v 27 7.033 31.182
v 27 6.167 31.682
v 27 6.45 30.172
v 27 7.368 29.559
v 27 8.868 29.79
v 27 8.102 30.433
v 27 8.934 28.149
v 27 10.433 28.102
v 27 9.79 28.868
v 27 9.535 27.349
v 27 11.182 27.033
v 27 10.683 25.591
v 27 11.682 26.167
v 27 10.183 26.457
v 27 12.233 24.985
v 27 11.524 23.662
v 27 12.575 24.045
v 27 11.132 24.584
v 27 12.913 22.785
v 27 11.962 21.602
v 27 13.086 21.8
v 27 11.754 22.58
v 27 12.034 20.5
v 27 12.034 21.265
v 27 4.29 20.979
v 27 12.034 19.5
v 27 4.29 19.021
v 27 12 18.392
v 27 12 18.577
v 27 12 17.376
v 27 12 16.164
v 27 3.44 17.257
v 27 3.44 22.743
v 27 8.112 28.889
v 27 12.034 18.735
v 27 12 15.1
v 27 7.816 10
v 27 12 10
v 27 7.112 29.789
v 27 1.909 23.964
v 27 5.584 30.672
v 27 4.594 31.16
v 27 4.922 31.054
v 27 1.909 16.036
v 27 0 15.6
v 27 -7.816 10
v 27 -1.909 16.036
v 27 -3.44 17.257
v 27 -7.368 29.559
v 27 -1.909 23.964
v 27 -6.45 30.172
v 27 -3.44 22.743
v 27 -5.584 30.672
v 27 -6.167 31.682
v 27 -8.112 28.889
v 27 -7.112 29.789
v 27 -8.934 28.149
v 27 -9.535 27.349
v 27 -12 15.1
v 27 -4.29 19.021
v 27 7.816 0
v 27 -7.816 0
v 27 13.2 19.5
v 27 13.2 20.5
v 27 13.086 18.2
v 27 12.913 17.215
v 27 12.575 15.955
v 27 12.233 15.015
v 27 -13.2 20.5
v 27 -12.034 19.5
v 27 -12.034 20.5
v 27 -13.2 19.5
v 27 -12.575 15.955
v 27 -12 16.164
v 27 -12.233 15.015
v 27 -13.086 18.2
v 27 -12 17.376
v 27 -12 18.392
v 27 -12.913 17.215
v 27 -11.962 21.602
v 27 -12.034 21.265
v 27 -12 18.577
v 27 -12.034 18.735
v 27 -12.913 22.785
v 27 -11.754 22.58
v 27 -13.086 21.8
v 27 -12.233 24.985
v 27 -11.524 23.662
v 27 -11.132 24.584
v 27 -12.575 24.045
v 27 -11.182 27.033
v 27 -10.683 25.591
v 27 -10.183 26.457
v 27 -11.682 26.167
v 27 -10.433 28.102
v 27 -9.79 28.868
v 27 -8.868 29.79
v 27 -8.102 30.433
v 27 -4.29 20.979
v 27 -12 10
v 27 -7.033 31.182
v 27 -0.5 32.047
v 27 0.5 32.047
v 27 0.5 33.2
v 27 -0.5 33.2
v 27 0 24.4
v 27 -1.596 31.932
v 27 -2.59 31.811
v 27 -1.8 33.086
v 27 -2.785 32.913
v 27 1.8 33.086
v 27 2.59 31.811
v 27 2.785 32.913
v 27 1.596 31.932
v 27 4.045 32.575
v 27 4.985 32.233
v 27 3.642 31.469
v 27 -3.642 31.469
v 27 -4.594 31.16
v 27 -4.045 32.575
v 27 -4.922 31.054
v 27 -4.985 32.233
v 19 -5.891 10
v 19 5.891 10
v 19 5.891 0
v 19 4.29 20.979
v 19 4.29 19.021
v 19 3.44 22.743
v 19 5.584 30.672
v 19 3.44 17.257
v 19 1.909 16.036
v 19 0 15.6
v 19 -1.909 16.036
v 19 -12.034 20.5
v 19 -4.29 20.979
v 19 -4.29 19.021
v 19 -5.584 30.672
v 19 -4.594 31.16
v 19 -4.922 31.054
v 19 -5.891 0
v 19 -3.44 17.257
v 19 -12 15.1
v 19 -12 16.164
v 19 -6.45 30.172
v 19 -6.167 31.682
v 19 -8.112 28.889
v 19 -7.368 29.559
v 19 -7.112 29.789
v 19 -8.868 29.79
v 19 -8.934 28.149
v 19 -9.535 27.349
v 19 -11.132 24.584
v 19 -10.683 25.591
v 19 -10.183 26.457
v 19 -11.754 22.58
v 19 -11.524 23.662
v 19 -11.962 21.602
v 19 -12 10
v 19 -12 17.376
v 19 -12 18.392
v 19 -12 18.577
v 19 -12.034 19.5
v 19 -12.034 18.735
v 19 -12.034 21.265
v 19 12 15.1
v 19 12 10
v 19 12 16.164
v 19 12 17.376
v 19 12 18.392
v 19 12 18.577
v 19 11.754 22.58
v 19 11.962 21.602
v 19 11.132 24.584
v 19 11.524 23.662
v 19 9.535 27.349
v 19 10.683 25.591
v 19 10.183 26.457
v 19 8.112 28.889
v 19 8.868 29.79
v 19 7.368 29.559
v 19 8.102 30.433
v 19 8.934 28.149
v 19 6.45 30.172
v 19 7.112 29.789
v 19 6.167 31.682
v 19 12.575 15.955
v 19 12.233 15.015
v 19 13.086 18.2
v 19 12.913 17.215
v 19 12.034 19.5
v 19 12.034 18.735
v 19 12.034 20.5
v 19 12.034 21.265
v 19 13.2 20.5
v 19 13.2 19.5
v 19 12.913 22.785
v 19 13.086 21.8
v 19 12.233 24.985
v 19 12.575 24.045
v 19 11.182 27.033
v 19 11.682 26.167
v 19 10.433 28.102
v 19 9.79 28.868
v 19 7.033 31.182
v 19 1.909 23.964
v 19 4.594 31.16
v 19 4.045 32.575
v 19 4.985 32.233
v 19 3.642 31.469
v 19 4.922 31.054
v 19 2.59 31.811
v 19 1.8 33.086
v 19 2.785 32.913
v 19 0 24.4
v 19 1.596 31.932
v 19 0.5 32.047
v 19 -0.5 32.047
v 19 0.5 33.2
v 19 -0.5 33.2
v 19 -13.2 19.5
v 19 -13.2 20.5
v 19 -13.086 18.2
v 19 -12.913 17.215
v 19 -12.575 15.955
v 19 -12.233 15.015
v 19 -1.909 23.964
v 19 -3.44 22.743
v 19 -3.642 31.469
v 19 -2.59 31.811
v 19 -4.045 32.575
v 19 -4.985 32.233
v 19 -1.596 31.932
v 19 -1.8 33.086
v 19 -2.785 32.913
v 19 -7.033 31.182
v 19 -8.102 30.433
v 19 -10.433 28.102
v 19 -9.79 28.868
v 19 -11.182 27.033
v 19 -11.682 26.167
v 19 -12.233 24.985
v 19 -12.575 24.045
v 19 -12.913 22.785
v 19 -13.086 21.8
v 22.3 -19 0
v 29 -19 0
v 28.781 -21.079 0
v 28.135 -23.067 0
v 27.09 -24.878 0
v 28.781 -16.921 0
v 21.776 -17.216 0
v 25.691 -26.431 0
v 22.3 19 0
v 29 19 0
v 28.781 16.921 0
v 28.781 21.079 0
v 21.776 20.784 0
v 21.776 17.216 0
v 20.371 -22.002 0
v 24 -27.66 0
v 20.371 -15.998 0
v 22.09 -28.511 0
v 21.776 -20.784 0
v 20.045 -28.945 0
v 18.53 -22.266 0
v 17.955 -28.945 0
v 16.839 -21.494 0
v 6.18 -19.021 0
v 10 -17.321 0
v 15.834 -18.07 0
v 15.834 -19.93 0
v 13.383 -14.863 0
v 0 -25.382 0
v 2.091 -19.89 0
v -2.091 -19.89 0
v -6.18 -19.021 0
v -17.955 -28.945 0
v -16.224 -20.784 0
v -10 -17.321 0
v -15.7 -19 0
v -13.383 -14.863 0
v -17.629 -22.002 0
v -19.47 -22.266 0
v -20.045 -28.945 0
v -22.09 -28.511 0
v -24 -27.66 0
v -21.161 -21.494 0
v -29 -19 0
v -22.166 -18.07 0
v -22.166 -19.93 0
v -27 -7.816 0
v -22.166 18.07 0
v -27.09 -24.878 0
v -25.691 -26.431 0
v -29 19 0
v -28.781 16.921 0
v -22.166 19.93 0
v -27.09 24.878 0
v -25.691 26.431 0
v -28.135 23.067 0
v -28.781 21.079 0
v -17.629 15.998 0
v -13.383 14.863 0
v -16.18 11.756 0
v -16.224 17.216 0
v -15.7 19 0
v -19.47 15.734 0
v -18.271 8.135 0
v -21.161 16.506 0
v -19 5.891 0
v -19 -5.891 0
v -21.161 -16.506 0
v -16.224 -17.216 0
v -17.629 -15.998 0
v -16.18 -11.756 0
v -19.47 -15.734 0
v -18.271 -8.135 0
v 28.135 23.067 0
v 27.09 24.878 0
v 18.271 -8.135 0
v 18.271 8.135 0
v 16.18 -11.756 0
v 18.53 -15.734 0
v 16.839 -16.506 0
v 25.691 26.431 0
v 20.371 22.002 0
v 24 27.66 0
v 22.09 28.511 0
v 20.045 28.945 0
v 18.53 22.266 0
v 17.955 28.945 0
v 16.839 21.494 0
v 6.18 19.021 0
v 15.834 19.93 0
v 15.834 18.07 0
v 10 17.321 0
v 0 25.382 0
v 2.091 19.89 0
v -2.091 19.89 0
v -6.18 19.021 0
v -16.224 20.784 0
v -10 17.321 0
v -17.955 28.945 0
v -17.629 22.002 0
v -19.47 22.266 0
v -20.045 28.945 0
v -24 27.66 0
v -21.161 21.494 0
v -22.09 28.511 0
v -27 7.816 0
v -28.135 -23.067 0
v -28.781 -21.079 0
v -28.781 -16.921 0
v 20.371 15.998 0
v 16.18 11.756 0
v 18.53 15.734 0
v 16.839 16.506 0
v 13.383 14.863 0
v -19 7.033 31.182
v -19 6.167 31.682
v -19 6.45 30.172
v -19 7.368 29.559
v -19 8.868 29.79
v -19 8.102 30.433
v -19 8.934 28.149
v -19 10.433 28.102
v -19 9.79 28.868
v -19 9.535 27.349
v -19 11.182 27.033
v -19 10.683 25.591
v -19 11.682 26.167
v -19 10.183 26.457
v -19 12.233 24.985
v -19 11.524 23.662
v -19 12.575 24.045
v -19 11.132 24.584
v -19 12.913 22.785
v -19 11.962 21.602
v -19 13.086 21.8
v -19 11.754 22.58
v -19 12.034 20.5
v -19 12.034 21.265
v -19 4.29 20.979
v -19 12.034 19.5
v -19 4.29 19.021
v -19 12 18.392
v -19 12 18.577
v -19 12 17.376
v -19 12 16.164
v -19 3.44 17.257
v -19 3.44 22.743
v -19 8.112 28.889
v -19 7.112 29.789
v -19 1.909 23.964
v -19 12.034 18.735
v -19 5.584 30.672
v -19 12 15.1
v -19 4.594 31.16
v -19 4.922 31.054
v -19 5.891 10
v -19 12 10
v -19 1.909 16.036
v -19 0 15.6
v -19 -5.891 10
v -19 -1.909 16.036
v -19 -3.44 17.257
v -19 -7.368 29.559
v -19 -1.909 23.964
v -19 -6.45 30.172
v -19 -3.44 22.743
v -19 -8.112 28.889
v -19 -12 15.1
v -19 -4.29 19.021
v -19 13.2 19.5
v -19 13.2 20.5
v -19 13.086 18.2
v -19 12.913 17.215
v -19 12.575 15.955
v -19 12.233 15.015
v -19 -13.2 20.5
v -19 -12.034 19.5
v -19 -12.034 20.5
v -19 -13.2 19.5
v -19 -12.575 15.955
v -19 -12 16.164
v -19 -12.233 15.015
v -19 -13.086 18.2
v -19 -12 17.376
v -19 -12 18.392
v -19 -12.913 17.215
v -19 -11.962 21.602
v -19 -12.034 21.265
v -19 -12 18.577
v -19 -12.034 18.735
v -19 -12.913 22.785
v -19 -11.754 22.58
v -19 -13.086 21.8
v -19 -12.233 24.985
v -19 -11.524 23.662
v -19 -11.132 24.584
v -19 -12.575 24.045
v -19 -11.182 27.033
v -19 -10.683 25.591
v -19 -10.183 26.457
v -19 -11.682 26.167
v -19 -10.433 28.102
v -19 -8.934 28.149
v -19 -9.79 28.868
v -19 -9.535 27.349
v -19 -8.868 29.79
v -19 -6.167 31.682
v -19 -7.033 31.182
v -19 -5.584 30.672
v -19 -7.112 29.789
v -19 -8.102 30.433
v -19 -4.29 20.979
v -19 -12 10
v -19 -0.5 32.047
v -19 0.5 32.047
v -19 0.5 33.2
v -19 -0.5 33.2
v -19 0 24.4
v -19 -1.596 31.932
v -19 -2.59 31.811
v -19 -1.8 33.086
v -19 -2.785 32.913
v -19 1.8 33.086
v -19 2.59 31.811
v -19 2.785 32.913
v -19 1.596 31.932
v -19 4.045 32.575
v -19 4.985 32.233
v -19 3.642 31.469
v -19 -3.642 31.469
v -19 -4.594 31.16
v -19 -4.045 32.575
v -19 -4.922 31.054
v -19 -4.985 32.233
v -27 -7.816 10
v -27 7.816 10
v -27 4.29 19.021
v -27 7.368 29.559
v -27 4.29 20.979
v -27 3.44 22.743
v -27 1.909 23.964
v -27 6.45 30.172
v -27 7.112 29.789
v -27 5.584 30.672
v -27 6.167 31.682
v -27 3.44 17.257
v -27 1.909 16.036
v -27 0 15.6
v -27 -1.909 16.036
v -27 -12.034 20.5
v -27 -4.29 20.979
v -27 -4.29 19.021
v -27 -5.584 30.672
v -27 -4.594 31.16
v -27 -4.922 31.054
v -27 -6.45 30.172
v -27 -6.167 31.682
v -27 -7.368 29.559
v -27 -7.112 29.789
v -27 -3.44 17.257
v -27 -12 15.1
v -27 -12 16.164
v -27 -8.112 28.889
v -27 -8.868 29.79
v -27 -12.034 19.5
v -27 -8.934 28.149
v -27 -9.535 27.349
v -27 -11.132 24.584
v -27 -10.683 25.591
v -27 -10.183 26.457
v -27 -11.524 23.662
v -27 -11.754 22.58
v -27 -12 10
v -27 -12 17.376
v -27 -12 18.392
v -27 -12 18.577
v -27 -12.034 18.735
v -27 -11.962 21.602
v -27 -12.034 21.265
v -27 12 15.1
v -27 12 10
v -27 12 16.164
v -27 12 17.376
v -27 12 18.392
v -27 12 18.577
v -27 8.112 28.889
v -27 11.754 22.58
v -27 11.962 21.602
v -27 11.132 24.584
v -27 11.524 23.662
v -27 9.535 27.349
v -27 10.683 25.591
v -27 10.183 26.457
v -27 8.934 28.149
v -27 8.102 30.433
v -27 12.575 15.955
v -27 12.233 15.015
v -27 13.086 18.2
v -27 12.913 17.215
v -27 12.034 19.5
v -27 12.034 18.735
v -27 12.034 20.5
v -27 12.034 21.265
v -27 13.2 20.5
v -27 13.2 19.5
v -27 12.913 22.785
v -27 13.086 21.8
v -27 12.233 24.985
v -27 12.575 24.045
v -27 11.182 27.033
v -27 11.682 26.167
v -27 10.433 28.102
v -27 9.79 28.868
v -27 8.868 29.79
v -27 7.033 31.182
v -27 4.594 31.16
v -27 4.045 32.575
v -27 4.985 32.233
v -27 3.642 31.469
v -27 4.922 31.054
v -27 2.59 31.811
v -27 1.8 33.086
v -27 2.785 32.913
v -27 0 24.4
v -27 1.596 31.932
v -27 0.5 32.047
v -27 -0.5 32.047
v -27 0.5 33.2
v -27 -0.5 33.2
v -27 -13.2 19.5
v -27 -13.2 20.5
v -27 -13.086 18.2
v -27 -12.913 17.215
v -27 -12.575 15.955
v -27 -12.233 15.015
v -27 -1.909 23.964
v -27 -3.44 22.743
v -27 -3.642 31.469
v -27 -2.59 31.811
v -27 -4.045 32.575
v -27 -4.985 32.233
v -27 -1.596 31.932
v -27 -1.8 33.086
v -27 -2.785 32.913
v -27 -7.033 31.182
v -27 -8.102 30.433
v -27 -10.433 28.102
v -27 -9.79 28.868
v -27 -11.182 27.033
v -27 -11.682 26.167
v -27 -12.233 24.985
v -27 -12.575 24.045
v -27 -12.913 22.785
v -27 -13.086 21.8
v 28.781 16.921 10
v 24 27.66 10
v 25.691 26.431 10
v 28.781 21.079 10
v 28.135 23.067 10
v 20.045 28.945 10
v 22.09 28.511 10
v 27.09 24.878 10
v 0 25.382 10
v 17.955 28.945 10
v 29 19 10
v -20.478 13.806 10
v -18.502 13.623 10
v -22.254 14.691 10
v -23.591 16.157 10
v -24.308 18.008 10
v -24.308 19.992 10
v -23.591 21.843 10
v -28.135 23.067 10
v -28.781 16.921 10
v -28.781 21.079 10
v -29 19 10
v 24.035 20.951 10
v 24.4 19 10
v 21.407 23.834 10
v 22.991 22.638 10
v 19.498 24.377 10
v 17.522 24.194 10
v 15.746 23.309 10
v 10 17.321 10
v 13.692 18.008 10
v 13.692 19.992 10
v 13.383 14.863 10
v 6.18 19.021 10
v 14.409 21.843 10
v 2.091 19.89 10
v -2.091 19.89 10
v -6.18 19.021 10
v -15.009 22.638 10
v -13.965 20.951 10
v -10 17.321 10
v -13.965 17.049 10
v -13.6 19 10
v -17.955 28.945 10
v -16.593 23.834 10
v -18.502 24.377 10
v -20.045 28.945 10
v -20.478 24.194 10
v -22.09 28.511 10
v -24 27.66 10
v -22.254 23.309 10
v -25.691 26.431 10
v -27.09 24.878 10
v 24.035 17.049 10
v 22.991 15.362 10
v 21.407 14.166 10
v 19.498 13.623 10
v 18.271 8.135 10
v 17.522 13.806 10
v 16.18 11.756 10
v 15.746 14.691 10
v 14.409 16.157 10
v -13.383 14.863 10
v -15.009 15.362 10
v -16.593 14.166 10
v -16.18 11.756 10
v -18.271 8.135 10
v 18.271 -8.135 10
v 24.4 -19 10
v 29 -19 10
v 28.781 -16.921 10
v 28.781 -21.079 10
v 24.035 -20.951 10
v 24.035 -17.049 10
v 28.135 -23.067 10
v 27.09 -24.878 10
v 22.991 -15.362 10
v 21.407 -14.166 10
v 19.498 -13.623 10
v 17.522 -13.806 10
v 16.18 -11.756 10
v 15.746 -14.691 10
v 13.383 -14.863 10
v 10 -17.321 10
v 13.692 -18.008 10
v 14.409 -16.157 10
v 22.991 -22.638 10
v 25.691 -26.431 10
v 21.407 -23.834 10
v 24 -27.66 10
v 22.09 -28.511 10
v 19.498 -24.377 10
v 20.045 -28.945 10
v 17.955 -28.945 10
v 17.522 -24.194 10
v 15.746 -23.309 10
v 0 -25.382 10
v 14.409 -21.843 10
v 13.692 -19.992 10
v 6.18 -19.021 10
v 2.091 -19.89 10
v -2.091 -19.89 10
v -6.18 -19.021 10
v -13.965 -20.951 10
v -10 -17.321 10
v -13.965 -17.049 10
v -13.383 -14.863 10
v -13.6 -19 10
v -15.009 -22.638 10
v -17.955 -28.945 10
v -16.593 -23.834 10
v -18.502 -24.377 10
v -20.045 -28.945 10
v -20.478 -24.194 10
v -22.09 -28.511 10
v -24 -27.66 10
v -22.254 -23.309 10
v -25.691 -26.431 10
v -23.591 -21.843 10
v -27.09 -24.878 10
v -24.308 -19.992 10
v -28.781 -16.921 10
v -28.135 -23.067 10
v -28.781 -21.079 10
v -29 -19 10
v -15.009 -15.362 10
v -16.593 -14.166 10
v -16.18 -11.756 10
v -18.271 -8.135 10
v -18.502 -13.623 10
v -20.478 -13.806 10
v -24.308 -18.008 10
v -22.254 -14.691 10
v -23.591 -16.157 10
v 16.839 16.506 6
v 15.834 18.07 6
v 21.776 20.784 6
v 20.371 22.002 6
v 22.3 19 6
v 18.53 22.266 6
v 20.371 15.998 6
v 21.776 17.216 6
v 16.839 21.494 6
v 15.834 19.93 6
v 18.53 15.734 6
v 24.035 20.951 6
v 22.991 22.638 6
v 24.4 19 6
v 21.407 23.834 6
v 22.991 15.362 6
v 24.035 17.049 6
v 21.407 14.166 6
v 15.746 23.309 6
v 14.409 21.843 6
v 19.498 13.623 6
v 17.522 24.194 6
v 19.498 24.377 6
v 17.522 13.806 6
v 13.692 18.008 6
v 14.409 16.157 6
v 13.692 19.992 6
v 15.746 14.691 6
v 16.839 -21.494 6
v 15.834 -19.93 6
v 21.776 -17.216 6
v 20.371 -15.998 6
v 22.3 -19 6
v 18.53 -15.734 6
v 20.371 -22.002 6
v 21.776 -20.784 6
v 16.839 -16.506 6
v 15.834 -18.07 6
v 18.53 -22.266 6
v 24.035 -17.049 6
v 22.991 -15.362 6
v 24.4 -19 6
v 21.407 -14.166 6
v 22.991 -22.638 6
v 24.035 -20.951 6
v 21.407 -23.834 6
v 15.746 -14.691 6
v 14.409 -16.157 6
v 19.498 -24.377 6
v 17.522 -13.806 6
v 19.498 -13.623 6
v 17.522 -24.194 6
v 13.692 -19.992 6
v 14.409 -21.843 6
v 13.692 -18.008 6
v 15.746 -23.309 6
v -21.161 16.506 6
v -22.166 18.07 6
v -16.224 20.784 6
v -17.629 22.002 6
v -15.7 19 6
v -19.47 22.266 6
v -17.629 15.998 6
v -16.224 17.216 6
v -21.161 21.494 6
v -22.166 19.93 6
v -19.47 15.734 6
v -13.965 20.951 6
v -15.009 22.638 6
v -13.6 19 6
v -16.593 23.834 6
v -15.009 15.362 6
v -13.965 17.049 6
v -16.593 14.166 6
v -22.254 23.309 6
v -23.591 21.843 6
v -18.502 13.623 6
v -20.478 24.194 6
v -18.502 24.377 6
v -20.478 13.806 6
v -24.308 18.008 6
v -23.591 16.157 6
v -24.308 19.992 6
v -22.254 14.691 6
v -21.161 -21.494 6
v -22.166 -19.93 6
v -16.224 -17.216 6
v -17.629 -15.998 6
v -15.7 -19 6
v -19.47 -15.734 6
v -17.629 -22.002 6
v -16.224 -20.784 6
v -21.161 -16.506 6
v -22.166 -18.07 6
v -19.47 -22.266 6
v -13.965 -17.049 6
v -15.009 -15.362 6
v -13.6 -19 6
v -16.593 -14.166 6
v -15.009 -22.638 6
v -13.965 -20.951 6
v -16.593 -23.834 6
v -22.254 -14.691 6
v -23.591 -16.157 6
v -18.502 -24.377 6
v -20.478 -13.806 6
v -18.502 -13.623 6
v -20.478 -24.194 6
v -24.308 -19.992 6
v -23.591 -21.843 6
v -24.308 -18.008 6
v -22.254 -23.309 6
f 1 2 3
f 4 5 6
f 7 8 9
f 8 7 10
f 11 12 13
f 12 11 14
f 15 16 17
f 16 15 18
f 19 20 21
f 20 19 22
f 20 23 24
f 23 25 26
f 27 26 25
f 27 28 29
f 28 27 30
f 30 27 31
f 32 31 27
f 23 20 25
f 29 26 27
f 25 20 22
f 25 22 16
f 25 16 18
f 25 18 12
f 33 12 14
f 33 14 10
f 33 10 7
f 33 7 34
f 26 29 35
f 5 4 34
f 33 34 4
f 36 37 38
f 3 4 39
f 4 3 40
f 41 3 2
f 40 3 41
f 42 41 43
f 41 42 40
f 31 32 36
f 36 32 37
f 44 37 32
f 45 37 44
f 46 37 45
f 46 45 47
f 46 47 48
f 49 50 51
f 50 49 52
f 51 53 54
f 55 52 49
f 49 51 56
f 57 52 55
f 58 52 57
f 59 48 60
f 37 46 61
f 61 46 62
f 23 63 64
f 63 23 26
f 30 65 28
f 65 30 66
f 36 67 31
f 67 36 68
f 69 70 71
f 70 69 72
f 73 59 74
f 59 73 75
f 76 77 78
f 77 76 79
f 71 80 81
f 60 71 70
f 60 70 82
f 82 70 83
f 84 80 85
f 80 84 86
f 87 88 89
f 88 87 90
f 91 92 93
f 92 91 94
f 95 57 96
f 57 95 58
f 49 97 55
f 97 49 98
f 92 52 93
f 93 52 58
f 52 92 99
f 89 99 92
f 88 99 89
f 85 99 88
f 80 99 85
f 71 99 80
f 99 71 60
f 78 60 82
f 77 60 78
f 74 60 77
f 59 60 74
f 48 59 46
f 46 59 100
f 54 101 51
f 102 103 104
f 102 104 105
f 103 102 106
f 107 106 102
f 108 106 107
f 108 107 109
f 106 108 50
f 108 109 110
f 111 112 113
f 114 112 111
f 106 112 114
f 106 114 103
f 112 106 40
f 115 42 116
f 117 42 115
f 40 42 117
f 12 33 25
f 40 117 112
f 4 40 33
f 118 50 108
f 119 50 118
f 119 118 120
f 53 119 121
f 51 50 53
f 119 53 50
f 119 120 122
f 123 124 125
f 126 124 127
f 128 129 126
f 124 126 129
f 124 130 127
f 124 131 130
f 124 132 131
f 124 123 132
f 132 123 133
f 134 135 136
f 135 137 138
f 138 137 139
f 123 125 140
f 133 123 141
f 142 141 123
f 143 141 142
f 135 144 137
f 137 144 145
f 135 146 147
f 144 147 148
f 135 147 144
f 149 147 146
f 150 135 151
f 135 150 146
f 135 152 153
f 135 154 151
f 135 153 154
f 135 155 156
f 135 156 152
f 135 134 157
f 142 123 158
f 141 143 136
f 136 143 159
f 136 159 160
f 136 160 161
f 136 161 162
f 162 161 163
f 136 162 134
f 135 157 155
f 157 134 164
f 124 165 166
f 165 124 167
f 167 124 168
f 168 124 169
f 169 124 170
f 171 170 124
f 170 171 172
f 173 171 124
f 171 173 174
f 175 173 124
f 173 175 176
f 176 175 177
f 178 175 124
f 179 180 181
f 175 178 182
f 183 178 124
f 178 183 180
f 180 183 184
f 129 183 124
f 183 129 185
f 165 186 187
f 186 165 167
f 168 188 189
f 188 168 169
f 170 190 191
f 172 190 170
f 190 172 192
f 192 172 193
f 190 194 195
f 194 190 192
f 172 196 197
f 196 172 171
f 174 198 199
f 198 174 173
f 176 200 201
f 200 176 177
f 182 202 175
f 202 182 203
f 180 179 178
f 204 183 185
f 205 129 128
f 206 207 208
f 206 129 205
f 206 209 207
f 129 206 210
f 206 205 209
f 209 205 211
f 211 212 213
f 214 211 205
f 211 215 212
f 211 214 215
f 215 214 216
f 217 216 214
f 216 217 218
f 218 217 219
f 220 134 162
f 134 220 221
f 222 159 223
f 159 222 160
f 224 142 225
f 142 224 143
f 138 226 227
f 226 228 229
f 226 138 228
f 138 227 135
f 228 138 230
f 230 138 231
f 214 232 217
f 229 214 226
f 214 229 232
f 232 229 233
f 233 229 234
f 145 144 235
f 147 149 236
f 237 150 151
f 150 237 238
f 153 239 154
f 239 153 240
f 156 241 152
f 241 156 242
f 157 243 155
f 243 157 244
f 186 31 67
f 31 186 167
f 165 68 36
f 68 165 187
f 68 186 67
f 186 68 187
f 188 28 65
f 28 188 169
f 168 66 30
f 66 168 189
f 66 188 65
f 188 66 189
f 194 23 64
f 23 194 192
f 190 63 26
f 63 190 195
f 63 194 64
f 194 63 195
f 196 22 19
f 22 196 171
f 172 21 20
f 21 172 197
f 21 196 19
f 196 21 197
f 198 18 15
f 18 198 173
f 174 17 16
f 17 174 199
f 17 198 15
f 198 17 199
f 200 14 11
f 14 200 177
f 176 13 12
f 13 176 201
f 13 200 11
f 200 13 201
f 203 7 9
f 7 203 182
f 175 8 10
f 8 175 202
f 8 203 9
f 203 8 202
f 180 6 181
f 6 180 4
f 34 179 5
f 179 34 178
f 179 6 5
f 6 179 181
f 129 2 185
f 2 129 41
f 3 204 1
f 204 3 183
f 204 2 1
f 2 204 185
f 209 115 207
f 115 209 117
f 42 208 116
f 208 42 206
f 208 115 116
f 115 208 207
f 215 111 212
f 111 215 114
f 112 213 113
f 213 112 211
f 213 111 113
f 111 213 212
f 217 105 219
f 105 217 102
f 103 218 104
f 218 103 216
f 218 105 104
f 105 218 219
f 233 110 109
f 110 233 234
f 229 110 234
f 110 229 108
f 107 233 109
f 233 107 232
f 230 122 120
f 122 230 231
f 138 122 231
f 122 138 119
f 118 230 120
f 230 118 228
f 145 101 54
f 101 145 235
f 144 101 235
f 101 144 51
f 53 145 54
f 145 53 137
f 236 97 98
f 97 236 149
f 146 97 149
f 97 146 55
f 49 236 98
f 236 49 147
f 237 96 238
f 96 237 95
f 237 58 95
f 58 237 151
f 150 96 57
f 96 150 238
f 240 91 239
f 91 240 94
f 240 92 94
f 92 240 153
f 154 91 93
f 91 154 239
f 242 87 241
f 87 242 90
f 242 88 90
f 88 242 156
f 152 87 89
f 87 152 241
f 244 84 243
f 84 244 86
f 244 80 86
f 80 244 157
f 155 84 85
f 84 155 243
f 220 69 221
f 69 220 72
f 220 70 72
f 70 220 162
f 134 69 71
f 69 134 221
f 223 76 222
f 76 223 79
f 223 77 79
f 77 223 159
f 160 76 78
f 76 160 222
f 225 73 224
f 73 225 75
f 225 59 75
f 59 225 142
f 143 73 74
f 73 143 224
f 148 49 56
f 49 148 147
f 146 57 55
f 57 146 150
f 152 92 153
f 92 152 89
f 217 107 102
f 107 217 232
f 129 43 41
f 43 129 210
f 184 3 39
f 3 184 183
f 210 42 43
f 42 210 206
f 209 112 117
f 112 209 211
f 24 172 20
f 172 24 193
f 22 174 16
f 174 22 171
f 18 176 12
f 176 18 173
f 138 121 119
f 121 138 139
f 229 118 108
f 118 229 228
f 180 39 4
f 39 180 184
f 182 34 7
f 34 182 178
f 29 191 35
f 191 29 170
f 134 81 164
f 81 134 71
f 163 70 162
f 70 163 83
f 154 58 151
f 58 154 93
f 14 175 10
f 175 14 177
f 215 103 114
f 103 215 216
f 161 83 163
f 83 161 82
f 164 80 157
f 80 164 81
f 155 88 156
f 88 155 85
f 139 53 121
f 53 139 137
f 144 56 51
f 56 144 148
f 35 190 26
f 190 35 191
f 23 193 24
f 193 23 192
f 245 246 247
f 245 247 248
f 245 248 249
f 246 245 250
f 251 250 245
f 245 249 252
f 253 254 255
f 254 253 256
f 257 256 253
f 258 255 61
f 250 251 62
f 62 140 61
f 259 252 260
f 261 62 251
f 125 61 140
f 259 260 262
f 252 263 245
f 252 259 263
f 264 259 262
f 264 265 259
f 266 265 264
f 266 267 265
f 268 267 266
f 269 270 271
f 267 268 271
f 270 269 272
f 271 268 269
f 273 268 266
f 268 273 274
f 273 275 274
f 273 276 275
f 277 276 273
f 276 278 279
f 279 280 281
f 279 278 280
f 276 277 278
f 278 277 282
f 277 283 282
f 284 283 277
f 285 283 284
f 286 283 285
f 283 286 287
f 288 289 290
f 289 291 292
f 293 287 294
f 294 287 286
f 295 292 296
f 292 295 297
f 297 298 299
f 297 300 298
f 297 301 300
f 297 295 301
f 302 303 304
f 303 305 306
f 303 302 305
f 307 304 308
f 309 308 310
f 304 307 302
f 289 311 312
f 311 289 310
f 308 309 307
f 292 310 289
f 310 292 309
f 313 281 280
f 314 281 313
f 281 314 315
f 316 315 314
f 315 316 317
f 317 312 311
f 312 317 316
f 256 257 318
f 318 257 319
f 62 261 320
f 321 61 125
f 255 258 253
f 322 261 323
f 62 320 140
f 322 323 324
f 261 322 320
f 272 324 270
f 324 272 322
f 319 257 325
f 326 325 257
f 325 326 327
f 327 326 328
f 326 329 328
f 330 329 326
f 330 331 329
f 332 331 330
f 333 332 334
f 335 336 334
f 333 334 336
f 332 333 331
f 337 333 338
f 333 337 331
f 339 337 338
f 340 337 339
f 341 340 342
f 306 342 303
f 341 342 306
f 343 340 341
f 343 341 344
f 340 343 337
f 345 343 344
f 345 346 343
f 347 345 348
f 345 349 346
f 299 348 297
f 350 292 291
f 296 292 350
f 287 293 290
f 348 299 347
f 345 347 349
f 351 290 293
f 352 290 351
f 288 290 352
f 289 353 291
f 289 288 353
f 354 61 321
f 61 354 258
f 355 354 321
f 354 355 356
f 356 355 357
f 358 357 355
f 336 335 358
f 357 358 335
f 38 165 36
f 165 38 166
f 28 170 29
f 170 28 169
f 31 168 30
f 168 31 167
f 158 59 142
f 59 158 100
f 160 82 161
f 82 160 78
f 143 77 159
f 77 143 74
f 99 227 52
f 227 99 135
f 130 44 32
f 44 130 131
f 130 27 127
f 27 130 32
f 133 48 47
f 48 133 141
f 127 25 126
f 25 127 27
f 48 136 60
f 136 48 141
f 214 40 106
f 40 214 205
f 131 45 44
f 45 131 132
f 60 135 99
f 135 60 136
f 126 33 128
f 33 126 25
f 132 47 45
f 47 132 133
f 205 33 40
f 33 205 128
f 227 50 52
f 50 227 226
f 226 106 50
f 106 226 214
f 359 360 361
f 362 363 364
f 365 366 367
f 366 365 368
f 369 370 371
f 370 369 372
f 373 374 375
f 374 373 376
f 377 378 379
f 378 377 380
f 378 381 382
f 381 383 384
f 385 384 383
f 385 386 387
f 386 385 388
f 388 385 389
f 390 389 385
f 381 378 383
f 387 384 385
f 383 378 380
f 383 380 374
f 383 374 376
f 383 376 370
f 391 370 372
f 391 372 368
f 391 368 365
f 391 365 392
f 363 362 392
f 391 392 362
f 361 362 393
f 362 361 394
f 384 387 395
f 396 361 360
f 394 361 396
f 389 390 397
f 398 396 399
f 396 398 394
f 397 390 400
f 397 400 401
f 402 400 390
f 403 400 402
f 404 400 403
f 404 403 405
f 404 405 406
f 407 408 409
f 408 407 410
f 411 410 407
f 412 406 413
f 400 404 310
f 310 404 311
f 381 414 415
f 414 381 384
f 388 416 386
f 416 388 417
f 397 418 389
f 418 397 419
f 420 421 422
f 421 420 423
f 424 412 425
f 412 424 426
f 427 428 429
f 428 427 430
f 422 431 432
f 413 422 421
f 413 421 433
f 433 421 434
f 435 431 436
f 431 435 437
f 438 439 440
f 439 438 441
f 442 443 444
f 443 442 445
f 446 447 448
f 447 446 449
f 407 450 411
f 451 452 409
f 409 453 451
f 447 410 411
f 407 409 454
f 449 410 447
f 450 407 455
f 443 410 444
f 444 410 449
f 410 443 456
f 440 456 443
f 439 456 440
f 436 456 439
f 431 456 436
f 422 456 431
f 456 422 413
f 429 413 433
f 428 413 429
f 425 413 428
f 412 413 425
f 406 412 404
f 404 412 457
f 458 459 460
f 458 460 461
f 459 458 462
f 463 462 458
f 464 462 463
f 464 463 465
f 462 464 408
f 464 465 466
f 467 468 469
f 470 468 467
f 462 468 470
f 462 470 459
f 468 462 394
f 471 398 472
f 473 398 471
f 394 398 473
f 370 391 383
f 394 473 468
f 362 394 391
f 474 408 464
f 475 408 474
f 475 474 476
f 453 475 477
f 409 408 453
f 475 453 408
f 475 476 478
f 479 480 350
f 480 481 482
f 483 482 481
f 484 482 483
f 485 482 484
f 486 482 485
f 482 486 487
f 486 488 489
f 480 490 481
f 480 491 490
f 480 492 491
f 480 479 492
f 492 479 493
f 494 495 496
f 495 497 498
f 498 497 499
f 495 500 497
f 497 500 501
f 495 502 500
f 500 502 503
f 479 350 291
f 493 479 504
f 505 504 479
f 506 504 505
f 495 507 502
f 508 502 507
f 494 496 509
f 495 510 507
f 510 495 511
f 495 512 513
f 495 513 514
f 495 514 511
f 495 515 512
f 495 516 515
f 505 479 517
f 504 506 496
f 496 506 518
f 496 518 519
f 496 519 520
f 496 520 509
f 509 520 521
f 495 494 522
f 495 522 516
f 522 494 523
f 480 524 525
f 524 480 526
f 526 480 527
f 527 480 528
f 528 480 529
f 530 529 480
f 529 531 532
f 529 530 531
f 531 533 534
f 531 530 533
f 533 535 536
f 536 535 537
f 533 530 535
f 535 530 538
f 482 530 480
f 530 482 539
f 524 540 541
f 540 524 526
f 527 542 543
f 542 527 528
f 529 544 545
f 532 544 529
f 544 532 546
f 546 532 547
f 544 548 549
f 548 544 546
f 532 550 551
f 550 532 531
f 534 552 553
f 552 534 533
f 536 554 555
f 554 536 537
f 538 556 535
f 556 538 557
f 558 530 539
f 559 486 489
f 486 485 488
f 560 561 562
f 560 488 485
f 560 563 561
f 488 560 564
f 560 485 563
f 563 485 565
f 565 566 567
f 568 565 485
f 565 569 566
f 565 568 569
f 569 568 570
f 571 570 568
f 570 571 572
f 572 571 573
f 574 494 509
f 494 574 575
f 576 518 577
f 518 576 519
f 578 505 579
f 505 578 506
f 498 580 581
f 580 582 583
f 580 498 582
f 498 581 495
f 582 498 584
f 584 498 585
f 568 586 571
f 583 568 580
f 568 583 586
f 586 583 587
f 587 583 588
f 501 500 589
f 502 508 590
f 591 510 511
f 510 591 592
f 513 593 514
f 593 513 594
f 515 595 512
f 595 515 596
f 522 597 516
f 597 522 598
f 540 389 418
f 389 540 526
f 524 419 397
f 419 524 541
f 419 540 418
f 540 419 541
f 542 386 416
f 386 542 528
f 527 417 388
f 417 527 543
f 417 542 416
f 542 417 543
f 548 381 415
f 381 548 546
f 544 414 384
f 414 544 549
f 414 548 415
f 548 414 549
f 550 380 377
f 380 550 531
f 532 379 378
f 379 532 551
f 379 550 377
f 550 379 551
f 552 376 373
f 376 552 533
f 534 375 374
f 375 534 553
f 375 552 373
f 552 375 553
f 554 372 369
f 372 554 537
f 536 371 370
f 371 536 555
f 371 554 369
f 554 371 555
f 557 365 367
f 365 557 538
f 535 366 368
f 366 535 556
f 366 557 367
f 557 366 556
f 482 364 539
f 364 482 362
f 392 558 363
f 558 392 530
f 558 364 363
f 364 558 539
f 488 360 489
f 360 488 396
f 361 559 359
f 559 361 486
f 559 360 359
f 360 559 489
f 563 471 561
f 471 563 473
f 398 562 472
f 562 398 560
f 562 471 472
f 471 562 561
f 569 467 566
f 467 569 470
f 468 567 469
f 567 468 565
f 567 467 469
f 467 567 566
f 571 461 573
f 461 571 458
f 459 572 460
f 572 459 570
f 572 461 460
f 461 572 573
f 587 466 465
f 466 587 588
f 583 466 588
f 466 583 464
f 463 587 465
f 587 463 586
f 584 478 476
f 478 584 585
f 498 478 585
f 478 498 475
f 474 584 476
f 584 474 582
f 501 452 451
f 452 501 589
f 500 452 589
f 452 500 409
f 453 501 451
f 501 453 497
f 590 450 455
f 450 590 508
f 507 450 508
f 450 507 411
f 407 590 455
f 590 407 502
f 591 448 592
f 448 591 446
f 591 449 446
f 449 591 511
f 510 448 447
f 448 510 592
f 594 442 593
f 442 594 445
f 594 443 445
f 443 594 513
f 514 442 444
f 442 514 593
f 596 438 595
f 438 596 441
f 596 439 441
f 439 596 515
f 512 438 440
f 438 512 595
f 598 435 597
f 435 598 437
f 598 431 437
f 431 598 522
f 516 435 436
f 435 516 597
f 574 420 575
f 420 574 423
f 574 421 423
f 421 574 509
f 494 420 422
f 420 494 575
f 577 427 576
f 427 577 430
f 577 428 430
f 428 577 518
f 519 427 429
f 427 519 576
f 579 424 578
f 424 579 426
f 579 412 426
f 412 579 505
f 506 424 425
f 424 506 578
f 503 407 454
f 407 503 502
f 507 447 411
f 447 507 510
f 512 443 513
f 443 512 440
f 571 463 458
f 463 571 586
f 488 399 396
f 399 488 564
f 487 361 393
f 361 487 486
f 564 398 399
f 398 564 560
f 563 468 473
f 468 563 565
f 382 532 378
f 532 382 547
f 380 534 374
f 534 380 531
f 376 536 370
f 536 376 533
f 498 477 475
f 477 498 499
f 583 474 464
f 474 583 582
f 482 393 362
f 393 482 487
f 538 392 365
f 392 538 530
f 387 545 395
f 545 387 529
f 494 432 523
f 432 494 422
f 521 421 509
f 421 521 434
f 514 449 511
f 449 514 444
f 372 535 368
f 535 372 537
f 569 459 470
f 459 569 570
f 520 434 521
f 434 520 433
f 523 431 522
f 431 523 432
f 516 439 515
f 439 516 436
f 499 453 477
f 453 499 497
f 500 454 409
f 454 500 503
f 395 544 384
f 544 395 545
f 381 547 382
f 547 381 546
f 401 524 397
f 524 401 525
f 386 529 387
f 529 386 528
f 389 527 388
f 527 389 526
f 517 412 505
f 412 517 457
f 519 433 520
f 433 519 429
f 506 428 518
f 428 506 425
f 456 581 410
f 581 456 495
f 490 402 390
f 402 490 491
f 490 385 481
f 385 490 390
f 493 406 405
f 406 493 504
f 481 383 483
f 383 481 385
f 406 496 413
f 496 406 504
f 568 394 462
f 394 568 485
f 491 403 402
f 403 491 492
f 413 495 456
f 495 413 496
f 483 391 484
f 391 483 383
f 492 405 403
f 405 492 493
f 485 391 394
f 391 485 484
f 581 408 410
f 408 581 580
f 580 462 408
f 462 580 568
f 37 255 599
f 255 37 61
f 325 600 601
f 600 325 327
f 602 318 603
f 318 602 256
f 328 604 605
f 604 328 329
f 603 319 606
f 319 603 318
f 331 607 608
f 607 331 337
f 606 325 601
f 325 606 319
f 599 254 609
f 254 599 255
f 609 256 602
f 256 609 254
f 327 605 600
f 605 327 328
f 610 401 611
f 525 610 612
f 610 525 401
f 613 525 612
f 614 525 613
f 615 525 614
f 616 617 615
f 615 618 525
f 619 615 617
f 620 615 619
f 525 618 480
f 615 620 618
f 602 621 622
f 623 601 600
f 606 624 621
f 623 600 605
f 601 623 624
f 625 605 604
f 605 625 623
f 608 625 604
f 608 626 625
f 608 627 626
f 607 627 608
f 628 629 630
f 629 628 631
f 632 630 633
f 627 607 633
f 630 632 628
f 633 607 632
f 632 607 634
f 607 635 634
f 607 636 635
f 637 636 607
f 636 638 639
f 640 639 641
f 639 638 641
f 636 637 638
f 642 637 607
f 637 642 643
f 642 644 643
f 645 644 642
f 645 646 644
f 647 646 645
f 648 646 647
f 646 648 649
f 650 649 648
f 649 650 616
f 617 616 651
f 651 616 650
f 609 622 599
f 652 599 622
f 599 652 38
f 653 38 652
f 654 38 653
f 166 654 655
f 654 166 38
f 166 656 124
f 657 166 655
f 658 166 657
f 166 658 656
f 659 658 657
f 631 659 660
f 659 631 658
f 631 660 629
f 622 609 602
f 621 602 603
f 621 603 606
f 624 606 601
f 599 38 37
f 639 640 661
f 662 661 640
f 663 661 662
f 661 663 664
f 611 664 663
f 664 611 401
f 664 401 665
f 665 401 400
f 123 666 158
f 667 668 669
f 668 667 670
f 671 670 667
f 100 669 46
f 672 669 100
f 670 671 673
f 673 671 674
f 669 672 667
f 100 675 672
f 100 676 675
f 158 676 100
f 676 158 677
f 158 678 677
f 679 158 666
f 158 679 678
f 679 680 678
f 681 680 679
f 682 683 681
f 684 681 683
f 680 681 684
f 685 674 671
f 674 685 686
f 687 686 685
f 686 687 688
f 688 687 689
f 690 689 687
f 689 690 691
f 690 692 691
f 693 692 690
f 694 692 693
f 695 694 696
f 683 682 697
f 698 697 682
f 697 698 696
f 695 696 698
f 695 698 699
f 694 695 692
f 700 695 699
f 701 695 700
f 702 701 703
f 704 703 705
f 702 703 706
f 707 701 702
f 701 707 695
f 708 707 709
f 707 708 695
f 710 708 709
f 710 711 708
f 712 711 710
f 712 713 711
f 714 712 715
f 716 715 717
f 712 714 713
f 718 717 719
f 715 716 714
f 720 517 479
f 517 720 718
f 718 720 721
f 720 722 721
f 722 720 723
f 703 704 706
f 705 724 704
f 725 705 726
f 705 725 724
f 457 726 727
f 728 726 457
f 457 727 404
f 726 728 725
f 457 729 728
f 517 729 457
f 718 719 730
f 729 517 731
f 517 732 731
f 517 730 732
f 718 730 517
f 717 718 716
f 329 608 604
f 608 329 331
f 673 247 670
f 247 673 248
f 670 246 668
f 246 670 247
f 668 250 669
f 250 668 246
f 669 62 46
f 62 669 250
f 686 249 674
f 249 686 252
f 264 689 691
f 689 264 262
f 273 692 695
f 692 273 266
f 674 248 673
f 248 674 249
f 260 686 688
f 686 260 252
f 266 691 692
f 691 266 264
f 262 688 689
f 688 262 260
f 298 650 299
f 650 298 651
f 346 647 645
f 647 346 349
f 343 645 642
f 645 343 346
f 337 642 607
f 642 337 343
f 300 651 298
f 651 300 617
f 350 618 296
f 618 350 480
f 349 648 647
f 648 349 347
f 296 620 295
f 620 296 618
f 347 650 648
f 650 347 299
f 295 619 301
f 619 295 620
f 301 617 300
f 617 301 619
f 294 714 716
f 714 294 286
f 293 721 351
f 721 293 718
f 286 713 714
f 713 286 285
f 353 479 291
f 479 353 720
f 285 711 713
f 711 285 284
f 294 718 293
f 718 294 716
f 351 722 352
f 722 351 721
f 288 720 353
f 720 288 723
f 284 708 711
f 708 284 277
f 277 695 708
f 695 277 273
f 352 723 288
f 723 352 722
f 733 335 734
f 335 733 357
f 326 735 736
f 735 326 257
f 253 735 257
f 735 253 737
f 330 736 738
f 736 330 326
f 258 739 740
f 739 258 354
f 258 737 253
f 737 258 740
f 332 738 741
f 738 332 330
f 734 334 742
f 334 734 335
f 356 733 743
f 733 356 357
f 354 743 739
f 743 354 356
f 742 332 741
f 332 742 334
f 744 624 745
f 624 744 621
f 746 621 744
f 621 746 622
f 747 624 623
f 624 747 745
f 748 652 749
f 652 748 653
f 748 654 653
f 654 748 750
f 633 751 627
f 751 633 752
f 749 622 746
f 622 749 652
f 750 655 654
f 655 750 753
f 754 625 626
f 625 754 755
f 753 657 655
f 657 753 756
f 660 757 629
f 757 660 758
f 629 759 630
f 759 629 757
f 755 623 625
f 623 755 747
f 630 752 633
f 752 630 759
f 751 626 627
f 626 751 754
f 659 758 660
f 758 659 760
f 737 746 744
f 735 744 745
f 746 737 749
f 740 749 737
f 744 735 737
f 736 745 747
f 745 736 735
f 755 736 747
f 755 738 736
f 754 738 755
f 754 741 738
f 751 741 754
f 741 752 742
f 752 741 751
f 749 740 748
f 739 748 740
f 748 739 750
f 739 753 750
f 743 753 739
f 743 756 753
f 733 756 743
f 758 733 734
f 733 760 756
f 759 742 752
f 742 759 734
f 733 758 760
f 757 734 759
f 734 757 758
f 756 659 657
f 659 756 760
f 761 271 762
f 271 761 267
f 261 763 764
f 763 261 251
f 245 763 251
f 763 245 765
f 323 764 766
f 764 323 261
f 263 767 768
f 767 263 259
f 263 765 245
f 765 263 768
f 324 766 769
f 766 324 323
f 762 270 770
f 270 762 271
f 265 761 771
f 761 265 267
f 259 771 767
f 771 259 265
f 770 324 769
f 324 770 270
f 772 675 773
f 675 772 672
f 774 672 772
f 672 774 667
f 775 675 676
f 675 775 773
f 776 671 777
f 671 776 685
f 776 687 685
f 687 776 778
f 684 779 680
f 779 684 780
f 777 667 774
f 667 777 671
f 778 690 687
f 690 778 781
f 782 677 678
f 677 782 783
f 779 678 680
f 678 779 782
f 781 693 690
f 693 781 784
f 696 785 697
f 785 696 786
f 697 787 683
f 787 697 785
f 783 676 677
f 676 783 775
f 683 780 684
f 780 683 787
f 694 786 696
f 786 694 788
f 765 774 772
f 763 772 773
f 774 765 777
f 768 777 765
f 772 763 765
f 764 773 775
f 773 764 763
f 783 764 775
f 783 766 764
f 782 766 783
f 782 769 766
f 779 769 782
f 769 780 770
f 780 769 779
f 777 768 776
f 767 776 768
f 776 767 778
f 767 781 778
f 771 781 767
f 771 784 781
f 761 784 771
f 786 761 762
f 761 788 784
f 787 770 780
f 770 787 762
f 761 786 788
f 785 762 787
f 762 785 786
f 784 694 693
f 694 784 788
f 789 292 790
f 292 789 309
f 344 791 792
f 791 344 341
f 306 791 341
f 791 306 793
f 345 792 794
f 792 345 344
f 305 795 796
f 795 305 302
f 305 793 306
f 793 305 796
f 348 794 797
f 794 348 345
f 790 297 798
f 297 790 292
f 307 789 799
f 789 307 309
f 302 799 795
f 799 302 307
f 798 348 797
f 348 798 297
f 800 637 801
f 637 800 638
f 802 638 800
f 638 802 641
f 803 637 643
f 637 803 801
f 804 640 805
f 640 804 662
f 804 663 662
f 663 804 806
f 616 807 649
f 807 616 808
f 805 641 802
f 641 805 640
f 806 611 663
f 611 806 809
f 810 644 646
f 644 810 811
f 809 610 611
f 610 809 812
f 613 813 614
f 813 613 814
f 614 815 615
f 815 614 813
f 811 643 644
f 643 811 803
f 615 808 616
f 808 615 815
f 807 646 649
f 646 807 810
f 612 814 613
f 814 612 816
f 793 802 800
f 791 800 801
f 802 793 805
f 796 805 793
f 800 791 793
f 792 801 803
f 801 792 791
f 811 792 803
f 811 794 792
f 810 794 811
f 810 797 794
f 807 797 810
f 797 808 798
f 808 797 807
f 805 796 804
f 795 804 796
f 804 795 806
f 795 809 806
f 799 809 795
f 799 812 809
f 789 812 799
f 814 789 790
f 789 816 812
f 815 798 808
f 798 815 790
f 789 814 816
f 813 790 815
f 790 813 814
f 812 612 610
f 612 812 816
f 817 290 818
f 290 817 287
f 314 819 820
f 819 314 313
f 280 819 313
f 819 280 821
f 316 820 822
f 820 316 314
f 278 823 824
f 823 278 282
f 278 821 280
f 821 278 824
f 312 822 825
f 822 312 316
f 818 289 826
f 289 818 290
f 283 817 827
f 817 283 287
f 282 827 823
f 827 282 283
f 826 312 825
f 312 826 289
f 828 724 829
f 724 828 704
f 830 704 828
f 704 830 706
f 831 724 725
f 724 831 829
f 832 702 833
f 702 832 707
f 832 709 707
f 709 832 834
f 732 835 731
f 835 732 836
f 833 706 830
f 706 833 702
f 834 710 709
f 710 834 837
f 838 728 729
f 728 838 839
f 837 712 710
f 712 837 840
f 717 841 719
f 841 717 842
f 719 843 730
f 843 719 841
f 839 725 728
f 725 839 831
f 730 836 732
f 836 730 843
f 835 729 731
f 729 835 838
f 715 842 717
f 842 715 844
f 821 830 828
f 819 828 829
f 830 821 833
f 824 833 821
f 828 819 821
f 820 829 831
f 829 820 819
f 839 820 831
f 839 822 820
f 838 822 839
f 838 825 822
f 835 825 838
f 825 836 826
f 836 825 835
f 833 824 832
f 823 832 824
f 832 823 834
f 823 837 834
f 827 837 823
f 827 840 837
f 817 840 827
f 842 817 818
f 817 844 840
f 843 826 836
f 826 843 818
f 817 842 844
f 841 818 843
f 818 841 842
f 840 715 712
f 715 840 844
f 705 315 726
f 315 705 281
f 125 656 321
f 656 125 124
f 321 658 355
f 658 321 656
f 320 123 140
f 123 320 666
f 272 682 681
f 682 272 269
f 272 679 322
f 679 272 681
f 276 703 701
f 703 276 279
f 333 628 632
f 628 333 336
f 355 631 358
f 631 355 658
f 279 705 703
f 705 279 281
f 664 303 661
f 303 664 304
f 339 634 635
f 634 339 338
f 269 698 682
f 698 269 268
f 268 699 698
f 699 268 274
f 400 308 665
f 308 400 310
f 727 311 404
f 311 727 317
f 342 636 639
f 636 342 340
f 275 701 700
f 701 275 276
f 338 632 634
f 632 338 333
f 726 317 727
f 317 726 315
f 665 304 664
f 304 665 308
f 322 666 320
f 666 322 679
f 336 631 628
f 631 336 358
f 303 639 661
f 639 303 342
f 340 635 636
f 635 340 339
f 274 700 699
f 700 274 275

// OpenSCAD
g_thick = 10;

mount_bracket();

module mount_bracket(){
translate([19,0,0]) bracket_offset();
translate([-27,0,0]) bracket_offset();
bracket_plate();
}

module bracket_offset(){
difference(){
union(){
translate([0,-12,0]) cube([8,24,20]);
translate([0,0,20]) rotate([0,90,0] ) bracket_gear();
}//end union
translate([-1,0,20]) rotate([0,90,0] ) cylinder(r=4.4,h=9);
}//end diff
}// end part

module bracket_gear(){
union(){
cylinder(r=12.1,h=8);
for(a=[0:10:360]){
rotate([0,0,a]) translate([12,-.5,0]) cube([1.2,1,8]);
}//end for
}//end union
}

module bracket_plate(){
difference(){
union(){
for(x= [19,-19]){
for(y= [19,-19]){
hull(){
cylinder(r=25,h=g_thick);
translate([x,y,0]) cylinder(r=10,h=g_thick);
}//end y loop
}//end x loop
}//end hull
}//end union
cylinder(r=20,h=g_thick);
for(x= [19,-19]){
for(y= [19,-19]){
translate([x,y,0]) cylinder(r=3.3,h=g_thick);
translate([x,y,6]) cylinder(r=5.4,h=g_thick-6);
}//end y loop
}//end x loop
}// end diff
}// end part
